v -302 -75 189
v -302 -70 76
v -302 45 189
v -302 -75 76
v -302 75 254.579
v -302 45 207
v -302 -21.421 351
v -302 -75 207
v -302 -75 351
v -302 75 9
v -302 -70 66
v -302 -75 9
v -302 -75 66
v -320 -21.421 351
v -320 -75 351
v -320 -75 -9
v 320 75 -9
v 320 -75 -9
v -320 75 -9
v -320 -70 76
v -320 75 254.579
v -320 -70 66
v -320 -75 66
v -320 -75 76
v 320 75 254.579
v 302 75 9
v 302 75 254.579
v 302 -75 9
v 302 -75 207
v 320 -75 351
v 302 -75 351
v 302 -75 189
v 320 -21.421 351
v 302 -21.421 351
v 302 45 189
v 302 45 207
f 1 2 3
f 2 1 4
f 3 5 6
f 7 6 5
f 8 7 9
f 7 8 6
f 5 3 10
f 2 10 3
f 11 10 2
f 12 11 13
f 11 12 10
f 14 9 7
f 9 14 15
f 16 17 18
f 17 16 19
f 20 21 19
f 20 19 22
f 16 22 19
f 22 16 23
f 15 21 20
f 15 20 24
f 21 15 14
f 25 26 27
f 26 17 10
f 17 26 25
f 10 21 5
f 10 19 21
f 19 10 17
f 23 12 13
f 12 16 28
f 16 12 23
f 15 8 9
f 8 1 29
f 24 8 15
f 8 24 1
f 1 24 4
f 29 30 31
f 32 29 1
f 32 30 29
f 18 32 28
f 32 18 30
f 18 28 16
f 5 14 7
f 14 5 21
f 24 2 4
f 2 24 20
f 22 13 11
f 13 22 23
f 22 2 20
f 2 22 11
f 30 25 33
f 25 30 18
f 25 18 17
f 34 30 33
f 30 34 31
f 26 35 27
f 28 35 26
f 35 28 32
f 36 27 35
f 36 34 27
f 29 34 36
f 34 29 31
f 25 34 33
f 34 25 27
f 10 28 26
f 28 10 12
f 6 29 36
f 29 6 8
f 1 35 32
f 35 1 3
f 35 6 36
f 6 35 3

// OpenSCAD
    


mat_t = 18; //material thickness
hylle_d = 150;
hylle_w = 640-(2*mat_t);


vertical_spacing = 180;

support_h = 360;
support_d = 150;

support_spacing = 640/2;

module hylle(depth) {
    translate([0, 0, 0]){
        cube(size = [hylle_w, depth,mat_t],center=true);
    }
}

module support(x) {
    color("BurlyWood") {
       difference(){
       cube(size = [mat_t, support_d, support_h],center=true);
           translate([0,120,support_h/2]){
            rotate([45,0,0]){
                cube(size = [mat_t+2, 200, 200],center=true);
            }
        }
        }
    }
}


bottom_shelf_d = 150;
top_shelf_d = 120;

hylle(bottom_shelf_d);
translate([0, -(support_d-top_shelf_d)/2, vertical_spacing+mat_t]){ //Need to take in account the thickness of mat
    hylle(top_shelf_d);
}   

translate([-(hylle_w/2+mat_t/2), 0, support_h/2-mat_t/2]){
    difference(){
        support();
        translate([0,-support_d/2, -100]){
        cube(size = [mat_t+2, 10, 10],center=true);
        }
    }
}
translate([hylle_w/2+mat_t/2, 0, support_h/2-mat_t/2]){
        support();

}
